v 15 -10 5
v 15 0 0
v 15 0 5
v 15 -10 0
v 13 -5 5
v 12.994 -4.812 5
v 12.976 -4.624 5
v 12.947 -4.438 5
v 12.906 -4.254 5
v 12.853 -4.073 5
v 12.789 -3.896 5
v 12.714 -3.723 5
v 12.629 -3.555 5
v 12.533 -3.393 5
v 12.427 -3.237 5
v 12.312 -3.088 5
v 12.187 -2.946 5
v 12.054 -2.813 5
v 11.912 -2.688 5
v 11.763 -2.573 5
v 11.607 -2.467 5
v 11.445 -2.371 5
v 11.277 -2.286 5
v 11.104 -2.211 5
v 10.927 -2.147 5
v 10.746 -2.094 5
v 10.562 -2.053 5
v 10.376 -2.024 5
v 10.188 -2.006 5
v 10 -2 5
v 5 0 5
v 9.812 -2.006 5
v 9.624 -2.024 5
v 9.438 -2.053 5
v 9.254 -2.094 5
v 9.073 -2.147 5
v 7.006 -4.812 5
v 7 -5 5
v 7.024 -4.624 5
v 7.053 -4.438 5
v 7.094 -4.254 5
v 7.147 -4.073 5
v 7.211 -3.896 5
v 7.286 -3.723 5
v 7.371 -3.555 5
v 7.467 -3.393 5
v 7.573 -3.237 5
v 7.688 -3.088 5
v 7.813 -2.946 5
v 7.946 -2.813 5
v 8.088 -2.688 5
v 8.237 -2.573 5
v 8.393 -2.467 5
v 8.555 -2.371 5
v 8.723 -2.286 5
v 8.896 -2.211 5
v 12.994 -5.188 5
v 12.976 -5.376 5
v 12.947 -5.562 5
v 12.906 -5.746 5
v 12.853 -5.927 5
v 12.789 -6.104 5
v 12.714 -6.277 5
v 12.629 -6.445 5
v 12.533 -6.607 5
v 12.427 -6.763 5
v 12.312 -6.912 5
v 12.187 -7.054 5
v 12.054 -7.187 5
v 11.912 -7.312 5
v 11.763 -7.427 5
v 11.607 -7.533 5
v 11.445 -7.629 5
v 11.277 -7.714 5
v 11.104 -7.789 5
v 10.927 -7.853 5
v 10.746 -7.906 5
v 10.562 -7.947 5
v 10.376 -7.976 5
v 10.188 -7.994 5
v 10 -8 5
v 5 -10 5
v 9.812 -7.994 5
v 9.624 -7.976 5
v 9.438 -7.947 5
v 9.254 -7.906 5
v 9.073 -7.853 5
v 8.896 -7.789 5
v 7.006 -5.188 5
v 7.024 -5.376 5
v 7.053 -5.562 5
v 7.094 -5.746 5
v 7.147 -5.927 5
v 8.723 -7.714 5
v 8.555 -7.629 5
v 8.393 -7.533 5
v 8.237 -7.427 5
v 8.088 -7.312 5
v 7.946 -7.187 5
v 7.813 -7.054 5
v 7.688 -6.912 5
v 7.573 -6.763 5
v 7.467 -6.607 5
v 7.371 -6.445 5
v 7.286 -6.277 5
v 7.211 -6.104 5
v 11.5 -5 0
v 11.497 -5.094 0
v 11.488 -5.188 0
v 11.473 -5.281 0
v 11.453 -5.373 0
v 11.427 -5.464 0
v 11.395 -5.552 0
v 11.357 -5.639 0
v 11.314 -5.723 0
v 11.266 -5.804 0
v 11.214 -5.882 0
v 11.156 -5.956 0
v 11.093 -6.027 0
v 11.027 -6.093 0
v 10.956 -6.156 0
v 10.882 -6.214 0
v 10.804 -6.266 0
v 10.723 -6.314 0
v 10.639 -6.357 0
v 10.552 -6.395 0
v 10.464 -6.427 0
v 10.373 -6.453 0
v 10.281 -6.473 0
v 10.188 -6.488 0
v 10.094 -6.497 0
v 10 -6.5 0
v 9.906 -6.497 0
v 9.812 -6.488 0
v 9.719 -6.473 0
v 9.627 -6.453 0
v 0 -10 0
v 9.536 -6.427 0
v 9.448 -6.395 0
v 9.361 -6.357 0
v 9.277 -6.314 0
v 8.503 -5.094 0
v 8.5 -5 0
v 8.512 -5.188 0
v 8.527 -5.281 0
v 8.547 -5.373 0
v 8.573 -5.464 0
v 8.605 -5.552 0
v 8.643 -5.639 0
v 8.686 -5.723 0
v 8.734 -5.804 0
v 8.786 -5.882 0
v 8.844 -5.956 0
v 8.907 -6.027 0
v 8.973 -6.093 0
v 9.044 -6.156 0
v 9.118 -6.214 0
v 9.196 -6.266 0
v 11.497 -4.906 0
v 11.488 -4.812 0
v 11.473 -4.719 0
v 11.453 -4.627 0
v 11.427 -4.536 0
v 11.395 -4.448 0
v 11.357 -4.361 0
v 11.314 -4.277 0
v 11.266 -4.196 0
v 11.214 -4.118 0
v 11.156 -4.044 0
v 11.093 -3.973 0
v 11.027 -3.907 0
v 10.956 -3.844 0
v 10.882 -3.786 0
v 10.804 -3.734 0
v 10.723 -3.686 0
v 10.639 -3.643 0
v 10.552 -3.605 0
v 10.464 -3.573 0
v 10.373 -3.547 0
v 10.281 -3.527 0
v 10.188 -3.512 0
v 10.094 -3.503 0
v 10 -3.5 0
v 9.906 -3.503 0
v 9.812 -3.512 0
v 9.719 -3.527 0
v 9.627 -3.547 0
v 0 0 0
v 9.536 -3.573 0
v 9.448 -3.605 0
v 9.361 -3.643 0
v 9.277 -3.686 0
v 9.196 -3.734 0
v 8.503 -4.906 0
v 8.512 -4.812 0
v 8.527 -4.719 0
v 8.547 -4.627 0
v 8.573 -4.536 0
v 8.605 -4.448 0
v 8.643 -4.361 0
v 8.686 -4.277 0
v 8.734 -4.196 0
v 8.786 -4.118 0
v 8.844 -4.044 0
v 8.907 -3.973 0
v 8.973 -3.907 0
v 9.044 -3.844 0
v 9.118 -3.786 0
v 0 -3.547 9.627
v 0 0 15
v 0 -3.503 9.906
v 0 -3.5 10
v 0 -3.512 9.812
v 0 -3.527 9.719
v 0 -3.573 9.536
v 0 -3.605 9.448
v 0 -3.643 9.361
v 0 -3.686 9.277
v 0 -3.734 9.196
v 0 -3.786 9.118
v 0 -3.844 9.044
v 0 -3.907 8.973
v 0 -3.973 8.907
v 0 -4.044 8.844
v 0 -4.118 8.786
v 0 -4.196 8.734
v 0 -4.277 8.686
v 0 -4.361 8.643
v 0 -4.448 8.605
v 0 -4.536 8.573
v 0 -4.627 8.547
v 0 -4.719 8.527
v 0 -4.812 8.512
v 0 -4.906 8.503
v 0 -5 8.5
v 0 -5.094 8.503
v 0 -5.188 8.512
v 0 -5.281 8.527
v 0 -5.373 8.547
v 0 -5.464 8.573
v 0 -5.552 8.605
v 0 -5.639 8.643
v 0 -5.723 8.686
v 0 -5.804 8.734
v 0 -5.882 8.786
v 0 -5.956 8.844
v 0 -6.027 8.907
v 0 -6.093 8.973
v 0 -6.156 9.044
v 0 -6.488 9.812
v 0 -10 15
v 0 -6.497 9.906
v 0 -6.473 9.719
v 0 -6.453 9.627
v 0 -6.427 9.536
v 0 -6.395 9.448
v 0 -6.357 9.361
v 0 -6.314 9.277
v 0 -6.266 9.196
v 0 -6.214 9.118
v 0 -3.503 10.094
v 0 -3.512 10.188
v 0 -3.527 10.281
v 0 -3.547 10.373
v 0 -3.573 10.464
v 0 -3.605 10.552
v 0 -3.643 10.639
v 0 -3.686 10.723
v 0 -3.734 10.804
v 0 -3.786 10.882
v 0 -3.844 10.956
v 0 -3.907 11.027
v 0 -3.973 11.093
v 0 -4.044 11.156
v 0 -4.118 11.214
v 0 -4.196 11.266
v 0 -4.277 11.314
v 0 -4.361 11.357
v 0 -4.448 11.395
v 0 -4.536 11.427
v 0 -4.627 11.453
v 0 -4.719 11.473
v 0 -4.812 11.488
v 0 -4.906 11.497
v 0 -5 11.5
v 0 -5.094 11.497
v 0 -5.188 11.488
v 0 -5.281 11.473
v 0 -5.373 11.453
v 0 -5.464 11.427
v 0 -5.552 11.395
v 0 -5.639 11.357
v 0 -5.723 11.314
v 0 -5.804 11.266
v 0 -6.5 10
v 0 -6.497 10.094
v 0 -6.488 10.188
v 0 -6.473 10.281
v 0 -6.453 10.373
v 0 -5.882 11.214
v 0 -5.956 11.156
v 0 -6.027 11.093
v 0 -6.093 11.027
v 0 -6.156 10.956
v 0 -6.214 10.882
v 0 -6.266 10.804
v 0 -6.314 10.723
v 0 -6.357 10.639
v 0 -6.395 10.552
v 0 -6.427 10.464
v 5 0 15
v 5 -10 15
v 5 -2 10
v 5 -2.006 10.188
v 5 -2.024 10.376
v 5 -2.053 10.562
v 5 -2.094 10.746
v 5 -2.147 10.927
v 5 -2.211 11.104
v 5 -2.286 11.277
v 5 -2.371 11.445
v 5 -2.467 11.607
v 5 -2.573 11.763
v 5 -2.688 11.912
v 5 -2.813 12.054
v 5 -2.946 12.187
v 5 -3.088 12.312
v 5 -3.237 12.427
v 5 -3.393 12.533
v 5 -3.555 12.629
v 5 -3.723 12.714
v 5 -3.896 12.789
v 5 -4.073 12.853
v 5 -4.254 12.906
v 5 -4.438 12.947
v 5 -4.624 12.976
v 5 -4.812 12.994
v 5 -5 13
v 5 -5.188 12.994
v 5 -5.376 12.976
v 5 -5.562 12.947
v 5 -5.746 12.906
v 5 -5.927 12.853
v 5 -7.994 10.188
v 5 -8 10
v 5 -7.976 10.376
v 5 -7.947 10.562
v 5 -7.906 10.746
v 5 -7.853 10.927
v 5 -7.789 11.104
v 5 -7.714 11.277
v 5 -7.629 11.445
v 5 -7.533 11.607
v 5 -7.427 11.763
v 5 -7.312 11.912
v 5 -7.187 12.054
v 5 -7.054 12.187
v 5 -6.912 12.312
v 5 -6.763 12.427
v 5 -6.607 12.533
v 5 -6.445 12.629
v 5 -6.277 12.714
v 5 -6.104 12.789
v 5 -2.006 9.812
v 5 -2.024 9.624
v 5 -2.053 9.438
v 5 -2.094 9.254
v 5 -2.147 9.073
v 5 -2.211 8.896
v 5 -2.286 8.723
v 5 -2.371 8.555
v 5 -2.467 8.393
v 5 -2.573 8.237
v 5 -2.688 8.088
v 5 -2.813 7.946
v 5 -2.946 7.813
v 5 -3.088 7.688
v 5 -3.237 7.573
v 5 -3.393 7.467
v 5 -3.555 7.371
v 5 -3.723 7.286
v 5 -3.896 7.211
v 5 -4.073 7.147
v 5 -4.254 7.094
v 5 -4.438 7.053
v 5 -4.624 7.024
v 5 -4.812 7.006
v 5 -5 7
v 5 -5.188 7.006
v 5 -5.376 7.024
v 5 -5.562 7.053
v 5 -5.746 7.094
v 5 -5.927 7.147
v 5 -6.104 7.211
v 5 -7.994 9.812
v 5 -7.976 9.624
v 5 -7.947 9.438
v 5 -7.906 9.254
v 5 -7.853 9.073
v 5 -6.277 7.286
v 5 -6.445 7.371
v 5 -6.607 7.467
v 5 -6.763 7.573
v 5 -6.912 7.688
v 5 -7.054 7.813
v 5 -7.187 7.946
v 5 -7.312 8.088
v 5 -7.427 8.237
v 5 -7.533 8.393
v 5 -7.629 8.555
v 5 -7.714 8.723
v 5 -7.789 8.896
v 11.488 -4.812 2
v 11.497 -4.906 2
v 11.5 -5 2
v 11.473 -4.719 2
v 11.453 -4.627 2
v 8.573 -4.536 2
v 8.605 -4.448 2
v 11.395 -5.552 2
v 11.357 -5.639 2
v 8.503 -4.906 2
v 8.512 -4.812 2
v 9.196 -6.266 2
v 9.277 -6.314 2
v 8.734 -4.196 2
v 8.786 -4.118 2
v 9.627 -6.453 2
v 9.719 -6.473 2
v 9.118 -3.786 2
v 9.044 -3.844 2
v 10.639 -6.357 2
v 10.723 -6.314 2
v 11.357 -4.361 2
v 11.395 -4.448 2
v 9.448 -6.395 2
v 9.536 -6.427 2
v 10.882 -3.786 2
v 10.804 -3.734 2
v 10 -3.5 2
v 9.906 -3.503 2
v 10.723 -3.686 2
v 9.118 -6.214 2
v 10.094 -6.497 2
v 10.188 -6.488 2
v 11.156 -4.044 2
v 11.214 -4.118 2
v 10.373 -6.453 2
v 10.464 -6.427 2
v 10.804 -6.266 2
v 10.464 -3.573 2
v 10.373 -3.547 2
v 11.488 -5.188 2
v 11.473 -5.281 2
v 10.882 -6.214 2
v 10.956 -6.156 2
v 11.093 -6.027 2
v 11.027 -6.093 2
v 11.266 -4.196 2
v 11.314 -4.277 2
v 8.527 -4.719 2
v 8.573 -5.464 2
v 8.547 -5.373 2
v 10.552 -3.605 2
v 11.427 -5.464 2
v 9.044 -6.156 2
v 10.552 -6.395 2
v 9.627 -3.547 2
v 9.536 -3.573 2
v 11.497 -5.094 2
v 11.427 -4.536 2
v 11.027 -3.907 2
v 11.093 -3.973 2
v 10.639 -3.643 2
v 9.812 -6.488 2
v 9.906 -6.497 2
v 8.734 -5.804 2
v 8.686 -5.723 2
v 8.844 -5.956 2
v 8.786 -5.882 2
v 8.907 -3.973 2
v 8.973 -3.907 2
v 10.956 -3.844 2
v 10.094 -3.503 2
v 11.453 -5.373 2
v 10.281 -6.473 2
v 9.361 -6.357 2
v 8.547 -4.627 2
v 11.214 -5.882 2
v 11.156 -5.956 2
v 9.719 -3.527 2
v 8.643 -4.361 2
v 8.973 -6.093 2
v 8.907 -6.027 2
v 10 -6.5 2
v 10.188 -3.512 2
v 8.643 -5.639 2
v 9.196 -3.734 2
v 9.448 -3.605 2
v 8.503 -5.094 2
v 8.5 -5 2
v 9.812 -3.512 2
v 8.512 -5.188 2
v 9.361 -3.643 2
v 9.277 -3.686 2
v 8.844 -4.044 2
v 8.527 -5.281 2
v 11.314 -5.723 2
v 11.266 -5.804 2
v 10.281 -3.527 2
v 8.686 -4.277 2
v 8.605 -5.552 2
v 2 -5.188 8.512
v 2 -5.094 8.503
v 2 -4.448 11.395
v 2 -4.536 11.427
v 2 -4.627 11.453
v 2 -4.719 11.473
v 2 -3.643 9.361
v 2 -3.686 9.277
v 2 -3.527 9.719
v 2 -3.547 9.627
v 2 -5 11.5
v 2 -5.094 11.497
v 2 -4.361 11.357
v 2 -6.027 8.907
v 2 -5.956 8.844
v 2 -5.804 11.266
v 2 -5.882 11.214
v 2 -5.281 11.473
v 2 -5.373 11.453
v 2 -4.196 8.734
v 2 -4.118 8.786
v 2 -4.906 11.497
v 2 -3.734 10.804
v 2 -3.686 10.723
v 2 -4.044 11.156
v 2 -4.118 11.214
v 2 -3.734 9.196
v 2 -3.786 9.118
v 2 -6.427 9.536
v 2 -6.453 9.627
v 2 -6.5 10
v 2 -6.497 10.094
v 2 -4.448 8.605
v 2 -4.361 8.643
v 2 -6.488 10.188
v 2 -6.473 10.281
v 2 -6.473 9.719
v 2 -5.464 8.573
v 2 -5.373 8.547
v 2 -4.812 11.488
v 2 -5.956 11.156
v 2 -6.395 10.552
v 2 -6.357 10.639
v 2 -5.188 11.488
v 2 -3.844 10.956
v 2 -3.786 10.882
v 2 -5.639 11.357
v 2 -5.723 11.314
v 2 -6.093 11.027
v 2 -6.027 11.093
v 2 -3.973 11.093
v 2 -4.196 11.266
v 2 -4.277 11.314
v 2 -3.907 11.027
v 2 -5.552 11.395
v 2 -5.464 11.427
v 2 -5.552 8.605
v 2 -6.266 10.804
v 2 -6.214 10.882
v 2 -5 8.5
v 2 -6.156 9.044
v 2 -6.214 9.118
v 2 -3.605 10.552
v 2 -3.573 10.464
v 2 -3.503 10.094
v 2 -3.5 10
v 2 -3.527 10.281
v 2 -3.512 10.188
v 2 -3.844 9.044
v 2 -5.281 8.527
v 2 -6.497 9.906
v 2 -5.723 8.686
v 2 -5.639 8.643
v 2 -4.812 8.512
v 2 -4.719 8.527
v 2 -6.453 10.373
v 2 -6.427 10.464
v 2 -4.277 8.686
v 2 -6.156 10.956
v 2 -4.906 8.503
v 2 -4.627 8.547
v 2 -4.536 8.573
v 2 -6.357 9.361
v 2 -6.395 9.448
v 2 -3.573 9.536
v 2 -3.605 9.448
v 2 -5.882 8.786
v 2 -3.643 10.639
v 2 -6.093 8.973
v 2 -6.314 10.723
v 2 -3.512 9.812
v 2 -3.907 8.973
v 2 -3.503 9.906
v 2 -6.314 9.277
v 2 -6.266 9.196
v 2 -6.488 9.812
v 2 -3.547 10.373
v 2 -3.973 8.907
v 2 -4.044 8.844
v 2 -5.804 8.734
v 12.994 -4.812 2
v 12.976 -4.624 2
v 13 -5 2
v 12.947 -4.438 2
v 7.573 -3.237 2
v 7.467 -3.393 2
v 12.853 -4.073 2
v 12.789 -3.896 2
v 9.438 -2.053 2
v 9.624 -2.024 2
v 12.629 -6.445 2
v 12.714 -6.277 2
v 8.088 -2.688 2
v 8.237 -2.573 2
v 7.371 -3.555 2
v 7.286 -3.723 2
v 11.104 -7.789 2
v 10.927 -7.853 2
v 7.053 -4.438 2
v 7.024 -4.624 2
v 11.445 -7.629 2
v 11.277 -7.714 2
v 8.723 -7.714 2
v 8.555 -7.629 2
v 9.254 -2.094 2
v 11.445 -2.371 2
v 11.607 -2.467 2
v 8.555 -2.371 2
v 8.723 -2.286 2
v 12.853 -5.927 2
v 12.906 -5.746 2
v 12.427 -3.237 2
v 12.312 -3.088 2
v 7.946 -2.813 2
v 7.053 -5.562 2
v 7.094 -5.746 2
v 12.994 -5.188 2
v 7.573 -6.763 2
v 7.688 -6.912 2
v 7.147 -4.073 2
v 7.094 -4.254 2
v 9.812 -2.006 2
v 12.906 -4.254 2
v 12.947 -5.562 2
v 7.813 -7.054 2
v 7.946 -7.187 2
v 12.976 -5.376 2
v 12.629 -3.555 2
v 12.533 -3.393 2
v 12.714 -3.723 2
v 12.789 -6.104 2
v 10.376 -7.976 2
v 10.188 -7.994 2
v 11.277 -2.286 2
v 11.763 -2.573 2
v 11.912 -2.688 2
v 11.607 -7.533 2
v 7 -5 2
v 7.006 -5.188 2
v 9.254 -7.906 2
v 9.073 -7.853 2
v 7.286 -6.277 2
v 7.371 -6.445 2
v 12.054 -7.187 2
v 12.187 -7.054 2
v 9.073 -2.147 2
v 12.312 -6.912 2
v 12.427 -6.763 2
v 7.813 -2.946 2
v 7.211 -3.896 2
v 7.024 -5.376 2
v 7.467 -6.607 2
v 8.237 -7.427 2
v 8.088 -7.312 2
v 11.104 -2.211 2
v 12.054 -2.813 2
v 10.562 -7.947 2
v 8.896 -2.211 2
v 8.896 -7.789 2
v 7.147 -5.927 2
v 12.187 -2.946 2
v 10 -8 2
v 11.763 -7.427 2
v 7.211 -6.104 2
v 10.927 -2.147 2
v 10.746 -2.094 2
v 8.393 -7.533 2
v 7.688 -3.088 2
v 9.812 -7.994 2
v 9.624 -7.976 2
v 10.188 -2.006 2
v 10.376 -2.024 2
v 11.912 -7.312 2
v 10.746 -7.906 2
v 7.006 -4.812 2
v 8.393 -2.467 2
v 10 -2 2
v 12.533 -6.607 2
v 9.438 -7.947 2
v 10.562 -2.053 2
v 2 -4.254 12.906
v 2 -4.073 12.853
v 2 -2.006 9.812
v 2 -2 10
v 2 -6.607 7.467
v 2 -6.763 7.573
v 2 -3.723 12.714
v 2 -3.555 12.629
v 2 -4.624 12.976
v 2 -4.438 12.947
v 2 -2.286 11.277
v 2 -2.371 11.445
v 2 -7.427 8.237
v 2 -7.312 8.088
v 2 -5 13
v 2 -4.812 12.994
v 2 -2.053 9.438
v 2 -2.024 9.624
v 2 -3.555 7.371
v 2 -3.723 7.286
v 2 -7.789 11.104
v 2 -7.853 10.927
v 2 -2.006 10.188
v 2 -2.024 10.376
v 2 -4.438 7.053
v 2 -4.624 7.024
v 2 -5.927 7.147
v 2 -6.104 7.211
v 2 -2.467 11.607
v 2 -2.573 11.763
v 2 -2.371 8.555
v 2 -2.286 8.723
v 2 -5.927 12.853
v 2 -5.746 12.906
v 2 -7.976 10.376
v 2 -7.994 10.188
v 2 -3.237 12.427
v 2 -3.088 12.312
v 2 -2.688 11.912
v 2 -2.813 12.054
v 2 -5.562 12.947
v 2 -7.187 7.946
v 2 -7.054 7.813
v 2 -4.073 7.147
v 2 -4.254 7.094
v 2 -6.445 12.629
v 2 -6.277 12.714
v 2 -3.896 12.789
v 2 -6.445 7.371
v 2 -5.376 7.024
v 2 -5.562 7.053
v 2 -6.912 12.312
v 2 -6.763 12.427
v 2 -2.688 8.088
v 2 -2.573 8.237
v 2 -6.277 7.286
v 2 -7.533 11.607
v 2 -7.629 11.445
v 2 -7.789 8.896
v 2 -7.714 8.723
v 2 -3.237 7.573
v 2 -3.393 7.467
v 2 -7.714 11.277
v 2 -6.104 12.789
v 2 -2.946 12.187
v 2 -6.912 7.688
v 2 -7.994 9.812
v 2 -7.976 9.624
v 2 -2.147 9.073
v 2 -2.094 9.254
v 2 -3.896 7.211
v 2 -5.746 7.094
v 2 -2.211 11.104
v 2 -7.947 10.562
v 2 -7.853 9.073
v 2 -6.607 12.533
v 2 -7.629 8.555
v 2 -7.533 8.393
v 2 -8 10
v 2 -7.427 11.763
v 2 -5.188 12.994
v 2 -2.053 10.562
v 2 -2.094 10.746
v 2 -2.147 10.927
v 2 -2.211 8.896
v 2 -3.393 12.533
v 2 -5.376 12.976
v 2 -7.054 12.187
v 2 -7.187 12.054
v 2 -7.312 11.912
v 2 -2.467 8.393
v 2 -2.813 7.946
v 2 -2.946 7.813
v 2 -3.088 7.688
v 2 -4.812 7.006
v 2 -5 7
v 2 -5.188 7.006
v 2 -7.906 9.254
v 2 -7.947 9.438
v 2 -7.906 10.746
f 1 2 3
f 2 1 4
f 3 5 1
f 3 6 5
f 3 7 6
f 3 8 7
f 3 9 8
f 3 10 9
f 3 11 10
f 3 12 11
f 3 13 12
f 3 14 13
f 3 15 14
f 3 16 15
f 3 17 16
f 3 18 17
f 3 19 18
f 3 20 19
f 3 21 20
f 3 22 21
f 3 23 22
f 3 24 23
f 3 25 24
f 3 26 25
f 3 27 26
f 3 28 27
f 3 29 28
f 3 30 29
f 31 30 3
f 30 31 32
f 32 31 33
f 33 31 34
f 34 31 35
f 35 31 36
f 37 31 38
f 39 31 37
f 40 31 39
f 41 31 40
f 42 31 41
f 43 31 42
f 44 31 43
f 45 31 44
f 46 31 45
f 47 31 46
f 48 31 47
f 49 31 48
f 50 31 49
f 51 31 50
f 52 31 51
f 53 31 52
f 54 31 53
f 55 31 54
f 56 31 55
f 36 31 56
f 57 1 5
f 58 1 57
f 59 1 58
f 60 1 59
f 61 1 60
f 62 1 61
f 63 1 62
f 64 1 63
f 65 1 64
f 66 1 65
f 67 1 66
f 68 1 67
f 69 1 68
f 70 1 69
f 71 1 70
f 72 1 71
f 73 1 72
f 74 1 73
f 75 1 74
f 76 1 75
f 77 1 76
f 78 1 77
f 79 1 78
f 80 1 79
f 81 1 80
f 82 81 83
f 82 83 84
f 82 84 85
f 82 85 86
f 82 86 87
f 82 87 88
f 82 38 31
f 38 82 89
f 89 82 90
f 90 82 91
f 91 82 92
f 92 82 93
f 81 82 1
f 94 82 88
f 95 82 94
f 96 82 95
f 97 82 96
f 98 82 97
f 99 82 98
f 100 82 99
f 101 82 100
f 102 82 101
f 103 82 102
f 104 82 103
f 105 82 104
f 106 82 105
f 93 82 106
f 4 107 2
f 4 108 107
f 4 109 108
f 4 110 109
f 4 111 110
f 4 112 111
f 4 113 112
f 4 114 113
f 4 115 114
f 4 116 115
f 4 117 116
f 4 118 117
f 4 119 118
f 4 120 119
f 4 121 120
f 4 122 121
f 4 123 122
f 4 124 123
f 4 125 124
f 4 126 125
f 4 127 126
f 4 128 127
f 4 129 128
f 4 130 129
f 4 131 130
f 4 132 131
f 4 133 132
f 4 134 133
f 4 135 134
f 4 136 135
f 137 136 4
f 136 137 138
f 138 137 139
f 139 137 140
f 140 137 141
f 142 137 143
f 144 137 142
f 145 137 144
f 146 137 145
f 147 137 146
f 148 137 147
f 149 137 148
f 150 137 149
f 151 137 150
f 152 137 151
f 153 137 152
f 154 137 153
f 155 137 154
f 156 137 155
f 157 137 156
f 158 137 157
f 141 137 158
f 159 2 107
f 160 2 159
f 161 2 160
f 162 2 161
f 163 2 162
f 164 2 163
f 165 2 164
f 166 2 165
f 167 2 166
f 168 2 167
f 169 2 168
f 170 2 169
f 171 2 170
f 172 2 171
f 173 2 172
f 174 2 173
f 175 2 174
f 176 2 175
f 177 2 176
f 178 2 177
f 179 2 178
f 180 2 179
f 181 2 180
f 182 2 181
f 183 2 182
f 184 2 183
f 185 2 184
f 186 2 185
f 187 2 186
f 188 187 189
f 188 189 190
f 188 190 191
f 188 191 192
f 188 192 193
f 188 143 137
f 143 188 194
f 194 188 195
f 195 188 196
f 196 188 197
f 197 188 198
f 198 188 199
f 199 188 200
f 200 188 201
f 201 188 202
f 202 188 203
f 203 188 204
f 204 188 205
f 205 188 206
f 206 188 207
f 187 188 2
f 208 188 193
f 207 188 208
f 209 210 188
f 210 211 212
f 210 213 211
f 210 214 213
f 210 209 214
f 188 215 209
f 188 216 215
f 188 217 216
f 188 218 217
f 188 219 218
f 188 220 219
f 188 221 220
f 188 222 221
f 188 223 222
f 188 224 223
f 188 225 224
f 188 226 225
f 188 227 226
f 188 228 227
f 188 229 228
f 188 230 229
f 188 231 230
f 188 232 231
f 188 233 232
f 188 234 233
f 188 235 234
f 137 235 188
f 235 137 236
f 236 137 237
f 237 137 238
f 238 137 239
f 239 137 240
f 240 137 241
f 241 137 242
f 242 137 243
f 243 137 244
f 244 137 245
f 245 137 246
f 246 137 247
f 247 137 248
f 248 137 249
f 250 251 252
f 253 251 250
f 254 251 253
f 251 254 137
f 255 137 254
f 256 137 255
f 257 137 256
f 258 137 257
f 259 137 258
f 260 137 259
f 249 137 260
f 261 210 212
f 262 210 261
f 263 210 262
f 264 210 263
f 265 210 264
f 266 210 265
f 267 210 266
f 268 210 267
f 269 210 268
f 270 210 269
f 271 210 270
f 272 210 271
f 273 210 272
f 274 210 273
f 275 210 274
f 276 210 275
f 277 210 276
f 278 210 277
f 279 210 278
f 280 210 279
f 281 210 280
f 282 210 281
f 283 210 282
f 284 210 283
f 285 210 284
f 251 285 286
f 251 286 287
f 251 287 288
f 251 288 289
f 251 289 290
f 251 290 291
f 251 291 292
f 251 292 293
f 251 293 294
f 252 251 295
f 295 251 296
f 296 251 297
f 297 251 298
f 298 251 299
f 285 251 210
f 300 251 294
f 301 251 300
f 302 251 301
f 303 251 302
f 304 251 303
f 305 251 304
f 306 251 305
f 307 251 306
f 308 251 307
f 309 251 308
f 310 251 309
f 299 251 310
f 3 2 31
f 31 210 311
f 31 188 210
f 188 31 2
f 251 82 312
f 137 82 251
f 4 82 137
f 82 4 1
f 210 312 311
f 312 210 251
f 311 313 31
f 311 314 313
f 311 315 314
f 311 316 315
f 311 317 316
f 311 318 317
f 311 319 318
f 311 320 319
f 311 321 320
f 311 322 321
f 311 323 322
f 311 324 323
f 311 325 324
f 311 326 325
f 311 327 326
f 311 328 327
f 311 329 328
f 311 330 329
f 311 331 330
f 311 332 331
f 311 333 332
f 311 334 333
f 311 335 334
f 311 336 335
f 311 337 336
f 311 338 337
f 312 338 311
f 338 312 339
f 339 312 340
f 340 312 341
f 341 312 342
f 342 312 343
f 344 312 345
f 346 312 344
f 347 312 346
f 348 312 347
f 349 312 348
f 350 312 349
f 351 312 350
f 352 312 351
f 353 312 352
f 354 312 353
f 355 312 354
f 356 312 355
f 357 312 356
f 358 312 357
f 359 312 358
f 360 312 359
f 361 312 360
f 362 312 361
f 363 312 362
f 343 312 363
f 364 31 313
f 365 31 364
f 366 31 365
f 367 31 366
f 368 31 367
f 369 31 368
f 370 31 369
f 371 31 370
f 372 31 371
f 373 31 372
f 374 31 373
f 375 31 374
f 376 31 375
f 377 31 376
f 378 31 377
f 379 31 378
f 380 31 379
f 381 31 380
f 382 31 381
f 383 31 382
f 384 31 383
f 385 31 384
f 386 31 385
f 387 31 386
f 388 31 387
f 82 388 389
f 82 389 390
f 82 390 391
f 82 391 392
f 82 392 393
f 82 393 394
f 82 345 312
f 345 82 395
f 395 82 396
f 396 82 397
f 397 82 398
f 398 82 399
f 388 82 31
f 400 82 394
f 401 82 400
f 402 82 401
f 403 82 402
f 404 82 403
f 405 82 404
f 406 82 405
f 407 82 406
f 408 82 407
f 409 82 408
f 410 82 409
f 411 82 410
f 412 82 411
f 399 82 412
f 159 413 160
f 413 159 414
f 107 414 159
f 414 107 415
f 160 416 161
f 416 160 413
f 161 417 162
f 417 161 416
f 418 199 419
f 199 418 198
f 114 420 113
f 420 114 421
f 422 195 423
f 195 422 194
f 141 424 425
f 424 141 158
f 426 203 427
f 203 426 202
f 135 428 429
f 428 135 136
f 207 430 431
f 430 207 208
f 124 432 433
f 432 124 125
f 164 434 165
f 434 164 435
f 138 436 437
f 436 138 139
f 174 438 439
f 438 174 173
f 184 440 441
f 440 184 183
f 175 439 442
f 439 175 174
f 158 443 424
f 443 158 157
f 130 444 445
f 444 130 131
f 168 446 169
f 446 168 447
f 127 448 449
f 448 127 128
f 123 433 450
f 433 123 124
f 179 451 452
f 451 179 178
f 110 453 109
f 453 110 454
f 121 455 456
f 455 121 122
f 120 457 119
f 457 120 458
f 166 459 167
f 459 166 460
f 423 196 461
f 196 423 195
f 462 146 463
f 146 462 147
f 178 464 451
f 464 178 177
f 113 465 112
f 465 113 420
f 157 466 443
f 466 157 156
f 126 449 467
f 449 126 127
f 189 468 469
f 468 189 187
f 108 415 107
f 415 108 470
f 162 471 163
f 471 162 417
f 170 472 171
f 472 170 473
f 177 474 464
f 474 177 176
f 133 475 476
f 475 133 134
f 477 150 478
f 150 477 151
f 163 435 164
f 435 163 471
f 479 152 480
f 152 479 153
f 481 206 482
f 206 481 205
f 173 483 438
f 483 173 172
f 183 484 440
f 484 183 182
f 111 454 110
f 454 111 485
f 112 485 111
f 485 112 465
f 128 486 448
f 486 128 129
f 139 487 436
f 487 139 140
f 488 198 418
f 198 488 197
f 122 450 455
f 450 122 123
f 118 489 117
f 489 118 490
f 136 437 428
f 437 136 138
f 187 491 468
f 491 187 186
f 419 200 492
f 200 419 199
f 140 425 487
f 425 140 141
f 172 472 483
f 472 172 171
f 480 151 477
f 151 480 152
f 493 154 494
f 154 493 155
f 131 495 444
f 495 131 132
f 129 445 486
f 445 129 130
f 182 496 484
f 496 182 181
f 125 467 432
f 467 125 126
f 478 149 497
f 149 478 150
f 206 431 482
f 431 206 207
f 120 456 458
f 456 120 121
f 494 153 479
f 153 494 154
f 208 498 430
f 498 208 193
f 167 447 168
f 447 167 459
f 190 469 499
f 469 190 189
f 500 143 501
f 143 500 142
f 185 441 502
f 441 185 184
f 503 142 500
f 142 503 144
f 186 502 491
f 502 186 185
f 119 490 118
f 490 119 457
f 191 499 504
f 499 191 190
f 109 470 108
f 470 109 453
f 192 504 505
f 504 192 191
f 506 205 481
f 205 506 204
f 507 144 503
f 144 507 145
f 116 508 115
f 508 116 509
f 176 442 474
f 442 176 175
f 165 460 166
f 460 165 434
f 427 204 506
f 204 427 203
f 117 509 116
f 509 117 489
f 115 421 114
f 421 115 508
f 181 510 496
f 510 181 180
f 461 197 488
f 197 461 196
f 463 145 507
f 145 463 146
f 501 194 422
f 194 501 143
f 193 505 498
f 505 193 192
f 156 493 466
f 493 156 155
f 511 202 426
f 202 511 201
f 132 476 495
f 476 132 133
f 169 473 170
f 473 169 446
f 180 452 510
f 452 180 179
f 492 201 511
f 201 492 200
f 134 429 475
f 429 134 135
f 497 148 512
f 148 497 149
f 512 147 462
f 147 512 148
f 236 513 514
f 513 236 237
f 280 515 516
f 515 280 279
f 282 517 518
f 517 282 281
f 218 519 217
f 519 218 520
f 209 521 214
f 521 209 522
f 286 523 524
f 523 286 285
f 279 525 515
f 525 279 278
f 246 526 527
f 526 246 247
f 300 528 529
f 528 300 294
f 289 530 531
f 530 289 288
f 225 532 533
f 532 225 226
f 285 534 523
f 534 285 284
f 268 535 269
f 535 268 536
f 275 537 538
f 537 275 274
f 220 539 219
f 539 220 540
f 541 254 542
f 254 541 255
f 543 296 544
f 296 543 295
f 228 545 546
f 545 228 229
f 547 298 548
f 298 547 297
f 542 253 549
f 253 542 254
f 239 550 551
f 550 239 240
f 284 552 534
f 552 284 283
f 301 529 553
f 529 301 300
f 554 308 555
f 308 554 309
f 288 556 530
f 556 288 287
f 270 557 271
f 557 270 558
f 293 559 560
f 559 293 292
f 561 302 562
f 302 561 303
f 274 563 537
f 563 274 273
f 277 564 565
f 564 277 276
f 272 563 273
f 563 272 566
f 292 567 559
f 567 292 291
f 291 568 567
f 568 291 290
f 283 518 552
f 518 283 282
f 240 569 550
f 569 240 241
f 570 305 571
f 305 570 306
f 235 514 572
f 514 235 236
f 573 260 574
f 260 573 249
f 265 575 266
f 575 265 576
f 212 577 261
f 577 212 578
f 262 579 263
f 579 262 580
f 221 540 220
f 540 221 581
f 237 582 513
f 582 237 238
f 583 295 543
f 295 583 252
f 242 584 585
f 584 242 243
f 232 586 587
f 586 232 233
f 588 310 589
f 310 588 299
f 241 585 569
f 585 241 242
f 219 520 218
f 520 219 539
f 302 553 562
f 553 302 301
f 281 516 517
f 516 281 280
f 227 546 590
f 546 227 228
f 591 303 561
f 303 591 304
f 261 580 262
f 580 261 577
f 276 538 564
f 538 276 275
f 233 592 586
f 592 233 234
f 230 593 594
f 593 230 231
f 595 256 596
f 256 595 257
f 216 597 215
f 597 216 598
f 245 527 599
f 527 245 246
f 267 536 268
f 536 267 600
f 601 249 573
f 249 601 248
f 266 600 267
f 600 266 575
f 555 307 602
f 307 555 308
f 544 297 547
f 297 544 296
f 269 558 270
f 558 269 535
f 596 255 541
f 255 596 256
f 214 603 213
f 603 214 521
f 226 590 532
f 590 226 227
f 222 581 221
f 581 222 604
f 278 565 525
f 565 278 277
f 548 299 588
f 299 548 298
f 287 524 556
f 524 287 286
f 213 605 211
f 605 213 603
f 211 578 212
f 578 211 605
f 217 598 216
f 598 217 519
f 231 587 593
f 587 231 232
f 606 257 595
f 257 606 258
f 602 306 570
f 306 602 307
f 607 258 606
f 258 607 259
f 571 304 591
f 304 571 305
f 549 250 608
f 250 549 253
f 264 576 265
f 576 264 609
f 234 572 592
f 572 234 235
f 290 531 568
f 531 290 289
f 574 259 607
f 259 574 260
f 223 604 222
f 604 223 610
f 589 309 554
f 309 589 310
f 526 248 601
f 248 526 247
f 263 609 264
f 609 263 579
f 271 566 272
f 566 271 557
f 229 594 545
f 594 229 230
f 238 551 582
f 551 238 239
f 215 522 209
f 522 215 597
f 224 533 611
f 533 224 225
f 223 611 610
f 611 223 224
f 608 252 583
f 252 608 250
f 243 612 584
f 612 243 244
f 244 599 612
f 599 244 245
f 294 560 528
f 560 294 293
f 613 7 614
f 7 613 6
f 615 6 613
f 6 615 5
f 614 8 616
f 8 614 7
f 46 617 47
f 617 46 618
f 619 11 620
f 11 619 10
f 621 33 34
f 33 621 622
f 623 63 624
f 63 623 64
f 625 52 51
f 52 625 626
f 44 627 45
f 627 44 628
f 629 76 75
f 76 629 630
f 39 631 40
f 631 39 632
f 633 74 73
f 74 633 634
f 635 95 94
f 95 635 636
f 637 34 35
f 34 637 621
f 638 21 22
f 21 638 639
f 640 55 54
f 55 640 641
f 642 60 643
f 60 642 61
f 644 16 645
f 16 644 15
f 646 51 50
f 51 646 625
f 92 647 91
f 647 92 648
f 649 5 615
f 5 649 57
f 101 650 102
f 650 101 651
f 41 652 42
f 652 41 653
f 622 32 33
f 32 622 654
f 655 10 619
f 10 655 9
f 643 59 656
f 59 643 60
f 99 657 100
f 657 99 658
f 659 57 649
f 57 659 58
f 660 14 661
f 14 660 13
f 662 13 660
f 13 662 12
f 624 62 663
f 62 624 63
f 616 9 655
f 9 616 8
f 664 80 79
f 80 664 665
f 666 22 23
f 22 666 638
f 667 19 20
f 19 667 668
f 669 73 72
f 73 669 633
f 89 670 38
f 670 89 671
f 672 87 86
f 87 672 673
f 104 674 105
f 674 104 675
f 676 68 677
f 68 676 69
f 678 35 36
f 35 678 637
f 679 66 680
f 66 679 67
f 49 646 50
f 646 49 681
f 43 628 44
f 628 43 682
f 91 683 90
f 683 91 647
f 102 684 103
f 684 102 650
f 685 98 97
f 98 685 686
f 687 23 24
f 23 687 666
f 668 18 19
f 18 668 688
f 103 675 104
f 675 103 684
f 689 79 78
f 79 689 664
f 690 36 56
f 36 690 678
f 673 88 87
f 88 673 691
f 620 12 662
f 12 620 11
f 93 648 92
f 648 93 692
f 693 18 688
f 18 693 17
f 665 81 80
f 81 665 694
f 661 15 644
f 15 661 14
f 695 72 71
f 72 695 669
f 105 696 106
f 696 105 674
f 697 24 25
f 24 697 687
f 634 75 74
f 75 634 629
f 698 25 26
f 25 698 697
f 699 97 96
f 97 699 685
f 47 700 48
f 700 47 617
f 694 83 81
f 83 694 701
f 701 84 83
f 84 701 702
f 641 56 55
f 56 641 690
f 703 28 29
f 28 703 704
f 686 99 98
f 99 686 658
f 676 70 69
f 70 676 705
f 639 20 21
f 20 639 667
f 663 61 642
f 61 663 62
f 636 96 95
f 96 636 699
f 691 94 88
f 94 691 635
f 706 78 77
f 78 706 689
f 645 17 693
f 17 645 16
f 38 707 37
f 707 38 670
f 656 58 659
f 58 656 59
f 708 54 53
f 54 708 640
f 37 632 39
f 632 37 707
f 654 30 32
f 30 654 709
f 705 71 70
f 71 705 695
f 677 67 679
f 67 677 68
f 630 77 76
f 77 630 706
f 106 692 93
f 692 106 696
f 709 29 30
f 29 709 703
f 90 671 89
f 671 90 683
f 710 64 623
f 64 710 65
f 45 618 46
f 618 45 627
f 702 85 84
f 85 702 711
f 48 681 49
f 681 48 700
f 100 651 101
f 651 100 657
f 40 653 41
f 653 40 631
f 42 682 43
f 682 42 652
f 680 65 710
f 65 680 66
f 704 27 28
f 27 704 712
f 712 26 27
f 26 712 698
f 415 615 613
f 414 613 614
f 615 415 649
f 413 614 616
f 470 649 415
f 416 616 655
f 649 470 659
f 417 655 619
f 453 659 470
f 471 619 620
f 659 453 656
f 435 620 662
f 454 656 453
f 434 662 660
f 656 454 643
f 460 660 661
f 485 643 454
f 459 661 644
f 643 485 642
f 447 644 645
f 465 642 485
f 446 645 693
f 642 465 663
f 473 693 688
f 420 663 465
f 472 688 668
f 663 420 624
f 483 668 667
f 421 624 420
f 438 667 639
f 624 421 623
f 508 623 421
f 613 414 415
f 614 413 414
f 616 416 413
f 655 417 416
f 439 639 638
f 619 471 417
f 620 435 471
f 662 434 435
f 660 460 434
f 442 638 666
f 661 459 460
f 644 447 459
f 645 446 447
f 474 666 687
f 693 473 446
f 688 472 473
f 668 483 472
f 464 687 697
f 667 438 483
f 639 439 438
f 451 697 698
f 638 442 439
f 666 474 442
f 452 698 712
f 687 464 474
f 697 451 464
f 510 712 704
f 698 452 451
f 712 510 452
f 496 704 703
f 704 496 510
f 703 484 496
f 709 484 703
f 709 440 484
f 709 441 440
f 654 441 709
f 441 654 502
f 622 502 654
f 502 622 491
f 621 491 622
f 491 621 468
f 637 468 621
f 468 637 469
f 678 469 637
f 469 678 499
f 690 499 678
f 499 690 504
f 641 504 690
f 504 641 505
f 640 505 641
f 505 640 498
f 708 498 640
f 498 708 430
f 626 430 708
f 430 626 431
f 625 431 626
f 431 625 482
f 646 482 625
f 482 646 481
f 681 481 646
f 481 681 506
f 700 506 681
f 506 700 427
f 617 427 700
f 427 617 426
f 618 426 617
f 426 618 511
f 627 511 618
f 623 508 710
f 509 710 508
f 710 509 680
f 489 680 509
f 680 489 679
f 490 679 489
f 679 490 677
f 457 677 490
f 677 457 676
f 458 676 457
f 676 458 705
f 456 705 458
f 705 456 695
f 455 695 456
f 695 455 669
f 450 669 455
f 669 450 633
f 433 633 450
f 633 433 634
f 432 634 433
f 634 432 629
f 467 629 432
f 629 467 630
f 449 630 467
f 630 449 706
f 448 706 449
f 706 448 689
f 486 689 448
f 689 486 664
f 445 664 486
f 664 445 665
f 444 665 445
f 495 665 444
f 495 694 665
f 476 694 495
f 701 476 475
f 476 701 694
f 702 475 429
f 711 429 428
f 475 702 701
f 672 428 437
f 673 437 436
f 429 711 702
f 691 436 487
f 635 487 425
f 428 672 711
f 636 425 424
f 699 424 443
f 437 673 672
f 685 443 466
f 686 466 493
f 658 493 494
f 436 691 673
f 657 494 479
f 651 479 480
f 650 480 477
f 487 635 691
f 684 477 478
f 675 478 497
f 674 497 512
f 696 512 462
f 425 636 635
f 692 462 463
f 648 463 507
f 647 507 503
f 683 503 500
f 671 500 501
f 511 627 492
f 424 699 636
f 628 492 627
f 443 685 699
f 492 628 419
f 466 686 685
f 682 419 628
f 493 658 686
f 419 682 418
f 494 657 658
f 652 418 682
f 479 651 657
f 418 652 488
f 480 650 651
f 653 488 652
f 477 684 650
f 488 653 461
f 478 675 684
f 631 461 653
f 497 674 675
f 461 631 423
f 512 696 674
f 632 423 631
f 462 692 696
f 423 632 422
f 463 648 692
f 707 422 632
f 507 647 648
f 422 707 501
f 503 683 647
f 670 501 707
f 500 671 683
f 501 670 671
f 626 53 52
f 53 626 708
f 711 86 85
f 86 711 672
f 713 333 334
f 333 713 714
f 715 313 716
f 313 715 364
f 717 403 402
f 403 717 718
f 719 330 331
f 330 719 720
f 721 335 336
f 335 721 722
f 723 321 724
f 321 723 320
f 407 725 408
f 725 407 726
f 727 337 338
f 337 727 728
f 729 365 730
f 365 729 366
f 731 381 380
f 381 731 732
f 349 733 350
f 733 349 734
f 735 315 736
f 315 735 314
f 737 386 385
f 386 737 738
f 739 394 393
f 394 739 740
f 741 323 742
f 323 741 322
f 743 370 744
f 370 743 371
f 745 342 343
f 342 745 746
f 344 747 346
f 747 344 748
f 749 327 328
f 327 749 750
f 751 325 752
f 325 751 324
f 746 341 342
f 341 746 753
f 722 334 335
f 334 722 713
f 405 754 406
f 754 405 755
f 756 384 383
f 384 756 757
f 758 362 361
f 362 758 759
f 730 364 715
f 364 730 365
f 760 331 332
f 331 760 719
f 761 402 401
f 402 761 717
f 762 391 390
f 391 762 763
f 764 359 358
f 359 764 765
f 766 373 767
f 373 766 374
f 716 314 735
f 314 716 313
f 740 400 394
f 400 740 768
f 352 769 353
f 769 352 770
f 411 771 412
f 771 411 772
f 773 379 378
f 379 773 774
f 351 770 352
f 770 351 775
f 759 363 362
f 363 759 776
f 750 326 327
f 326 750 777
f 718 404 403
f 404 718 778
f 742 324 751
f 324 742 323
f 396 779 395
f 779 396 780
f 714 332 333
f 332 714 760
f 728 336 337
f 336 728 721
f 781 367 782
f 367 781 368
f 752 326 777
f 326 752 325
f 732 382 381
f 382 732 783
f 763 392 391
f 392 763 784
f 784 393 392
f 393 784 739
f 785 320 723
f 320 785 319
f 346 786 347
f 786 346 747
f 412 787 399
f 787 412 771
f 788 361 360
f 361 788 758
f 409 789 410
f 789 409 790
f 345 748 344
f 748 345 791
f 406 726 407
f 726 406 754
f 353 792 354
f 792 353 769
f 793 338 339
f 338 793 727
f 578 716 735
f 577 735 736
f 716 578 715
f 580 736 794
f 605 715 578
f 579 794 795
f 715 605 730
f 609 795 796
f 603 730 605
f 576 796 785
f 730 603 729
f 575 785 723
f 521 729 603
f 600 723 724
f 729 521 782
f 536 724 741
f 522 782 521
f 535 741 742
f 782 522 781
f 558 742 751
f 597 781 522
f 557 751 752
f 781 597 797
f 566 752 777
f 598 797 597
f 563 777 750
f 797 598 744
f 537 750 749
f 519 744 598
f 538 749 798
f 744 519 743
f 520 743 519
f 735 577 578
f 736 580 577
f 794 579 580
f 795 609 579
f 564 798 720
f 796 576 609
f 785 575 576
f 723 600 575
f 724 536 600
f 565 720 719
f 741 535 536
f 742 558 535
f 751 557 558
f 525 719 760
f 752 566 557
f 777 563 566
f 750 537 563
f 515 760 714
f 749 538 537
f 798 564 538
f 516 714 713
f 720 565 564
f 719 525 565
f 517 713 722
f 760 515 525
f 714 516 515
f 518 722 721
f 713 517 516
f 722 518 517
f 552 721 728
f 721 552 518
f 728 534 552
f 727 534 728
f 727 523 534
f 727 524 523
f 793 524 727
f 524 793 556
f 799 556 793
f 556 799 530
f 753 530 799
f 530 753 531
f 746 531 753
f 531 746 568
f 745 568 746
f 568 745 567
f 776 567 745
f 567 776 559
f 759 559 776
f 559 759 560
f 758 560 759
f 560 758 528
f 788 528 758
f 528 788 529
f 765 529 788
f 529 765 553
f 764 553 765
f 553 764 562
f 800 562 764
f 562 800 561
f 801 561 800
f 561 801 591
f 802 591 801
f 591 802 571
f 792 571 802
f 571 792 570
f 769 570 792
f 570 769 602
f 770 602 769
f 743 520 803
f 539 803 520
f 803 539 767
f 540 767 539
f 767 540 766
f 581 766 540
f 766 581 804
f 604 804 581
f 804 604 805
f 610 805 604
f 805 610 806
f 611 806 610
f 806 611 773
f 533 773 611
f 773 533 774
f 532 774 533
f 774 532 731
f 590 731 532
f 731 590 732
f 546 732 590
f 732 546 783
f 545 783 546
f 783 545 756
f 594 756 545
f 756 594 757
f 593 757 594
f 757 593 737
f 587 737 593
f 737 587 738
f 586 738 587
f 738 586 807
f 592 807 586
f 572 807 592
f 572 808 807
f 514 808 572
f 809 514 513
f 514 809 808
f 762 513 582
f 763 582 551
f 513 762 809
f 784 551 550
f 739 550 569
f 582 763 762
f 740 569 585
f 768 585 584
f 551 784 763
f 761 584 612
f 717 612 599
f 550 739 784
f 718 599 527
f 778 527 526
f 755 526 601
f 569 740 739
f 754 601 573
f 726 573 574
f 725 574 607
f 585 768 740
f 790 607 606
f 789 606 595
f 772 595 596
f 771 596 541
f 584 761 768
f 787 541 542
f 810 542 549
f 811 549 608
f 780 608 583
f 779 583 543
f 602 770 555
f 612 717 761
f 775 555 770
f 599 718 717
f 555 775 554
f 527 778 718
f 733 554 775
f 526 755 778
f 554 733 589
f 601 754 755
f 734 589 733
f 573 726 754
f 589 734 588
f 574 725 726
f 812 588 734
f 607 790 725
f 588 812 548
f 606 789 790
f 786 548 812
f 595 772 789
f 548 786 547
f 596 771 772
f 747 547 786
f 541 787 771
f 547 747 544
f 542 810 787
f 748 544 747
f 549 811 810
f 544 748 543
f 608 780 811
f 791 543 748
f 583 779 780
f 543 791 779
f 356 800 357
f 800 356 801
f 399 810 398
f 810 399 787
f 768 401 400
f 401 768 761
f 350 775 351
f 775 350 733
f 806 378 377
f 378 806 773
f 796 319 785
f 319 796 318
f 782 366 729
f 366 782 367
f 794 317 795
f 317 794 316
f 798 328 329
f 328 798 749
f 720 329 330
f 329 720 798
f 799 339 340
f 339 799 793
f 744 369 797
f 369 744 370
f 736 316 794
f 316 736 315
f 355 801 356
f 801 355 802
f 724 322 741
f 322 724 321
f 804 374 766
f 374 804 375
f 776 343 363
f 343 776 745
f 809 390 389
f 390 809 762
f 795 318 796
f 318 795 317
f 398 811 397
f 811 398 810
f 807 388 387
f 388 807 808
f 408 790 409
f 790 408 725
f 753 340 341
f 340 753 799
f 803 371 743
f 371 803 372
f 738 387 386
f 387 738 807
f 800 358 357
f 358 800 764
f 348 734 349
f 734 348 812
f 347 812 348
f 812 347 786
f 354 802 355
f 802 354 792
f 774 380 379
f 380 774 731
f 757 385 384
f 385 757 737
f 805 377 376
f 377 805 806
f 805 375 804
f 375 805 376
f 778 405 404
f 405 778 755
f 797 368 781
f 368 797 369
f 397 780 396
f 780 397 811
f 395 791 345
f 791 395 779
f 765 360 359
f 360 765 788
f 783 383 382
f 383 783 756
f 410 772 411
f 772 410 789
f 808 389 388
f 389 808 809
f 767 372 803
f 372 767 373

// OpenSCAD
// ************* Credits part *************
// "Fixing customize" 
// Programmed by Rudy RUFFEL - Decembre 2014
// Optimized for Customizer makerbot
//
//
//********************** License ******************
//**         "Fixing customize" by rr2s          **
//**  is licensed under the Creative Commons     **
//** - Attribution - Non-Commercial license.     **
//*************************************************
//
//
// ************* Declaration part *************

/* [Dimensions] */ 
// (Width this number will be multiplied by the number of screws on height (in mm). Example : if you specify 15mm and there are two screws on height, the total height will be 30mm. The thickness of wall is proportional to the width if you indicates a width 15mm  the thickness will  5mm. But you can change if you wantt hickness in tab)
Width         = 15;       
// (Length of fixing this number will multipier by the number of screw on length (in mm). Example : if you specify 10 and there are two screws on length, the total length will be 20.)
Height        = 10;      

/* [screw] */
// (number of height screw, if you want one screw.)
NumberOfScrewHeight  = 1;
// (number of width screw)
NumberOfScrewWidth = 1; 
// (diameter of screw) 
DiametreScrew = 3;        
// (screw head diameter of generally 2 times the diameter of the screw. Attention ! Check that the width and height is supperior in diameter screws.)
DiametreHeadScrew = 6;
// (Height of the screw head, if you want that screw is flush chose 0. Attention ! Check that the width and height is supperior in diameter screws.)
HeightHeadScrew   = 3;
// (Resolution of screws)
ResolutionScrew=100; //[20:Draft,50:Medium,100:Fine, 200:Very fine]
	RS = ResolutionScrew;
// (Creates a hex or cylindrical head screws)
ResolutionHeadScrew=100; //[6:Bolt (hex),20:Draft,50:Medium,100:Fine, 200:Very fine]
	RH = ResolutionHeadScrew;


/* [Thickness] */
//(Thickness Wall is normaly proportional to the width (Width/3) if ThicknessWall = 0. But you can change if you want. Attention ! Check that the Thickness Wall is supperior at HeightHeadScrew.the dimention is in mm)
ThicknessWall = 0;



// ************* private variable *************
	//TH = Width/3;  //  ThicknessWall base if ThicknessWall = 0
	TH= ThicknessWall == 0  ? Width/3 : ThicknessWall;
	W = Width;     // Simplifying the Variable : Width 
	H = Height;    // Simplifying the Variable : Height
    NbScrew = NumberOfScrewHeight -1; // Simplifying the Variable : NumberOfScrewHeight
	rScrew = DiametreScrew/2;      // radius of the screw
	CWS = TH+((W-TH)/2); // centering the screw on width
	CHS = H/2; // centering the screw on Height
	rHScrew = DiametreHeadScrew/2;  //radius of the Head screw
	HHS = HeightHeadScrew; // Simplifying the Variable : HeightHeadScrew
	NbScrewWidth = NumberOfScrewWidth-1; // Simplifying the Variable :  NumberOfScrewWith


// ************* Executable part *************

difference(){
	Base();
	Cut();
}

// ************* Module part simple screw *************

// Module de construction
module BaseVolume(){
	for ( i = [0 : NbScrew] ){
		union() {
		translate([0,(H*i)-H,0])cube([W,H,TH]);
		translate([TH,(H*i)-H,0]) rotate([0,-90,0]) cube([W,H,TH]);
		}
	}
}

module BaseScrew(){
	for ( i = [0 : NbScrew] ){
		translate([CWS,CHS+((i*H)-H),-W]) cylinder(W*2,rScrew,rScrew,$fn=RS);
		translate([W,CHS+((i*H)-H),CWS]) rotate([0,-90,0]) cylinder(W*2,rScrew,rScrew,$fn=RS);
	}
}

module BaseScrewHead(){
	for ( i = [0 : NbScrew] ){
		translate([CWS,CHS+((i*H)-H),TH-HHS]) cylinder(W*2,rHScrew,rHScrew,$fn=RH);
		translate([(W*2)+TH-HHS,CHS+((i*H)-H),CWS]) rotate([0,-90,0]) cylinder(W*2,rHScrew,rHScrew,$fn=RH);
	}
}

// ************* Module part multi-screw *************

 module BaseVolumeMultiScrew(){
	for ( e = [0 : NbScrewWidth] ){
		for ( i = [0 : NbScrew] ){
			union() {
			translate([(W-TH)*e+TH,(H*i)-H,0])cube([W-TH,H,TH]);
			translate([TH,(H*i)-H,(W-TH)*e+TH]) rotate([0,-90,0]) cube([W-TH,H,TH]);
			}
		}
	}
}


module BaseScrewMulti(){
	for ( e = [0 : NbScrewWidth] ){
		for ( i = [0 : NbScrew] ){
			translate([CWS+((W-TH)*e),CHS+((i*H)-H),-W]) cylinder(W*2,rScrew,rScrew,$fn=RS);
			translate([W,CHS+((i*H)-H),CWS+(W-TH)*e]) rotate([0,-90,0]) cylinder(W*2,rScrew,rScrew,$fn=RS);
		}
	}
}


module BaseScrewHeadmulti(){
	for ( e = [0 : NbScrewWidth] ){
		for ( i = [0 : NbScrew] ){
			translate([CWS+((W-TH)*e),CHS+((i*H)-H),TH-HHS]) cylinder(W*2,rHScrew,rHScrew,$fn=RH);
			translate([(W*2)+TH-HHS,CHS+((i*H)-H),CWS+(W-TH)*e]) rotate([0,-90,0]) cylinder(W*2,rHScrew,rHScrew,$fn=RH);
		}
	}
}

// ************* Module grouping : base and cut  *************

// module of base
module Base(){
	union() {
		BaseVolume();
		if (NbScrew > 0 || NbScrewWidth > 0) {
		BaseVolumeMultiScrew();
		}
	}
}


// module of cut
module Cut(){
	BaseScrew();
	BaseScrewHead();
 	if (NbScrew > 0 || NbScrewWidth > 0) {
	BaseScrewMulti();
	BaseScrewHeadmulti();
	}
}
